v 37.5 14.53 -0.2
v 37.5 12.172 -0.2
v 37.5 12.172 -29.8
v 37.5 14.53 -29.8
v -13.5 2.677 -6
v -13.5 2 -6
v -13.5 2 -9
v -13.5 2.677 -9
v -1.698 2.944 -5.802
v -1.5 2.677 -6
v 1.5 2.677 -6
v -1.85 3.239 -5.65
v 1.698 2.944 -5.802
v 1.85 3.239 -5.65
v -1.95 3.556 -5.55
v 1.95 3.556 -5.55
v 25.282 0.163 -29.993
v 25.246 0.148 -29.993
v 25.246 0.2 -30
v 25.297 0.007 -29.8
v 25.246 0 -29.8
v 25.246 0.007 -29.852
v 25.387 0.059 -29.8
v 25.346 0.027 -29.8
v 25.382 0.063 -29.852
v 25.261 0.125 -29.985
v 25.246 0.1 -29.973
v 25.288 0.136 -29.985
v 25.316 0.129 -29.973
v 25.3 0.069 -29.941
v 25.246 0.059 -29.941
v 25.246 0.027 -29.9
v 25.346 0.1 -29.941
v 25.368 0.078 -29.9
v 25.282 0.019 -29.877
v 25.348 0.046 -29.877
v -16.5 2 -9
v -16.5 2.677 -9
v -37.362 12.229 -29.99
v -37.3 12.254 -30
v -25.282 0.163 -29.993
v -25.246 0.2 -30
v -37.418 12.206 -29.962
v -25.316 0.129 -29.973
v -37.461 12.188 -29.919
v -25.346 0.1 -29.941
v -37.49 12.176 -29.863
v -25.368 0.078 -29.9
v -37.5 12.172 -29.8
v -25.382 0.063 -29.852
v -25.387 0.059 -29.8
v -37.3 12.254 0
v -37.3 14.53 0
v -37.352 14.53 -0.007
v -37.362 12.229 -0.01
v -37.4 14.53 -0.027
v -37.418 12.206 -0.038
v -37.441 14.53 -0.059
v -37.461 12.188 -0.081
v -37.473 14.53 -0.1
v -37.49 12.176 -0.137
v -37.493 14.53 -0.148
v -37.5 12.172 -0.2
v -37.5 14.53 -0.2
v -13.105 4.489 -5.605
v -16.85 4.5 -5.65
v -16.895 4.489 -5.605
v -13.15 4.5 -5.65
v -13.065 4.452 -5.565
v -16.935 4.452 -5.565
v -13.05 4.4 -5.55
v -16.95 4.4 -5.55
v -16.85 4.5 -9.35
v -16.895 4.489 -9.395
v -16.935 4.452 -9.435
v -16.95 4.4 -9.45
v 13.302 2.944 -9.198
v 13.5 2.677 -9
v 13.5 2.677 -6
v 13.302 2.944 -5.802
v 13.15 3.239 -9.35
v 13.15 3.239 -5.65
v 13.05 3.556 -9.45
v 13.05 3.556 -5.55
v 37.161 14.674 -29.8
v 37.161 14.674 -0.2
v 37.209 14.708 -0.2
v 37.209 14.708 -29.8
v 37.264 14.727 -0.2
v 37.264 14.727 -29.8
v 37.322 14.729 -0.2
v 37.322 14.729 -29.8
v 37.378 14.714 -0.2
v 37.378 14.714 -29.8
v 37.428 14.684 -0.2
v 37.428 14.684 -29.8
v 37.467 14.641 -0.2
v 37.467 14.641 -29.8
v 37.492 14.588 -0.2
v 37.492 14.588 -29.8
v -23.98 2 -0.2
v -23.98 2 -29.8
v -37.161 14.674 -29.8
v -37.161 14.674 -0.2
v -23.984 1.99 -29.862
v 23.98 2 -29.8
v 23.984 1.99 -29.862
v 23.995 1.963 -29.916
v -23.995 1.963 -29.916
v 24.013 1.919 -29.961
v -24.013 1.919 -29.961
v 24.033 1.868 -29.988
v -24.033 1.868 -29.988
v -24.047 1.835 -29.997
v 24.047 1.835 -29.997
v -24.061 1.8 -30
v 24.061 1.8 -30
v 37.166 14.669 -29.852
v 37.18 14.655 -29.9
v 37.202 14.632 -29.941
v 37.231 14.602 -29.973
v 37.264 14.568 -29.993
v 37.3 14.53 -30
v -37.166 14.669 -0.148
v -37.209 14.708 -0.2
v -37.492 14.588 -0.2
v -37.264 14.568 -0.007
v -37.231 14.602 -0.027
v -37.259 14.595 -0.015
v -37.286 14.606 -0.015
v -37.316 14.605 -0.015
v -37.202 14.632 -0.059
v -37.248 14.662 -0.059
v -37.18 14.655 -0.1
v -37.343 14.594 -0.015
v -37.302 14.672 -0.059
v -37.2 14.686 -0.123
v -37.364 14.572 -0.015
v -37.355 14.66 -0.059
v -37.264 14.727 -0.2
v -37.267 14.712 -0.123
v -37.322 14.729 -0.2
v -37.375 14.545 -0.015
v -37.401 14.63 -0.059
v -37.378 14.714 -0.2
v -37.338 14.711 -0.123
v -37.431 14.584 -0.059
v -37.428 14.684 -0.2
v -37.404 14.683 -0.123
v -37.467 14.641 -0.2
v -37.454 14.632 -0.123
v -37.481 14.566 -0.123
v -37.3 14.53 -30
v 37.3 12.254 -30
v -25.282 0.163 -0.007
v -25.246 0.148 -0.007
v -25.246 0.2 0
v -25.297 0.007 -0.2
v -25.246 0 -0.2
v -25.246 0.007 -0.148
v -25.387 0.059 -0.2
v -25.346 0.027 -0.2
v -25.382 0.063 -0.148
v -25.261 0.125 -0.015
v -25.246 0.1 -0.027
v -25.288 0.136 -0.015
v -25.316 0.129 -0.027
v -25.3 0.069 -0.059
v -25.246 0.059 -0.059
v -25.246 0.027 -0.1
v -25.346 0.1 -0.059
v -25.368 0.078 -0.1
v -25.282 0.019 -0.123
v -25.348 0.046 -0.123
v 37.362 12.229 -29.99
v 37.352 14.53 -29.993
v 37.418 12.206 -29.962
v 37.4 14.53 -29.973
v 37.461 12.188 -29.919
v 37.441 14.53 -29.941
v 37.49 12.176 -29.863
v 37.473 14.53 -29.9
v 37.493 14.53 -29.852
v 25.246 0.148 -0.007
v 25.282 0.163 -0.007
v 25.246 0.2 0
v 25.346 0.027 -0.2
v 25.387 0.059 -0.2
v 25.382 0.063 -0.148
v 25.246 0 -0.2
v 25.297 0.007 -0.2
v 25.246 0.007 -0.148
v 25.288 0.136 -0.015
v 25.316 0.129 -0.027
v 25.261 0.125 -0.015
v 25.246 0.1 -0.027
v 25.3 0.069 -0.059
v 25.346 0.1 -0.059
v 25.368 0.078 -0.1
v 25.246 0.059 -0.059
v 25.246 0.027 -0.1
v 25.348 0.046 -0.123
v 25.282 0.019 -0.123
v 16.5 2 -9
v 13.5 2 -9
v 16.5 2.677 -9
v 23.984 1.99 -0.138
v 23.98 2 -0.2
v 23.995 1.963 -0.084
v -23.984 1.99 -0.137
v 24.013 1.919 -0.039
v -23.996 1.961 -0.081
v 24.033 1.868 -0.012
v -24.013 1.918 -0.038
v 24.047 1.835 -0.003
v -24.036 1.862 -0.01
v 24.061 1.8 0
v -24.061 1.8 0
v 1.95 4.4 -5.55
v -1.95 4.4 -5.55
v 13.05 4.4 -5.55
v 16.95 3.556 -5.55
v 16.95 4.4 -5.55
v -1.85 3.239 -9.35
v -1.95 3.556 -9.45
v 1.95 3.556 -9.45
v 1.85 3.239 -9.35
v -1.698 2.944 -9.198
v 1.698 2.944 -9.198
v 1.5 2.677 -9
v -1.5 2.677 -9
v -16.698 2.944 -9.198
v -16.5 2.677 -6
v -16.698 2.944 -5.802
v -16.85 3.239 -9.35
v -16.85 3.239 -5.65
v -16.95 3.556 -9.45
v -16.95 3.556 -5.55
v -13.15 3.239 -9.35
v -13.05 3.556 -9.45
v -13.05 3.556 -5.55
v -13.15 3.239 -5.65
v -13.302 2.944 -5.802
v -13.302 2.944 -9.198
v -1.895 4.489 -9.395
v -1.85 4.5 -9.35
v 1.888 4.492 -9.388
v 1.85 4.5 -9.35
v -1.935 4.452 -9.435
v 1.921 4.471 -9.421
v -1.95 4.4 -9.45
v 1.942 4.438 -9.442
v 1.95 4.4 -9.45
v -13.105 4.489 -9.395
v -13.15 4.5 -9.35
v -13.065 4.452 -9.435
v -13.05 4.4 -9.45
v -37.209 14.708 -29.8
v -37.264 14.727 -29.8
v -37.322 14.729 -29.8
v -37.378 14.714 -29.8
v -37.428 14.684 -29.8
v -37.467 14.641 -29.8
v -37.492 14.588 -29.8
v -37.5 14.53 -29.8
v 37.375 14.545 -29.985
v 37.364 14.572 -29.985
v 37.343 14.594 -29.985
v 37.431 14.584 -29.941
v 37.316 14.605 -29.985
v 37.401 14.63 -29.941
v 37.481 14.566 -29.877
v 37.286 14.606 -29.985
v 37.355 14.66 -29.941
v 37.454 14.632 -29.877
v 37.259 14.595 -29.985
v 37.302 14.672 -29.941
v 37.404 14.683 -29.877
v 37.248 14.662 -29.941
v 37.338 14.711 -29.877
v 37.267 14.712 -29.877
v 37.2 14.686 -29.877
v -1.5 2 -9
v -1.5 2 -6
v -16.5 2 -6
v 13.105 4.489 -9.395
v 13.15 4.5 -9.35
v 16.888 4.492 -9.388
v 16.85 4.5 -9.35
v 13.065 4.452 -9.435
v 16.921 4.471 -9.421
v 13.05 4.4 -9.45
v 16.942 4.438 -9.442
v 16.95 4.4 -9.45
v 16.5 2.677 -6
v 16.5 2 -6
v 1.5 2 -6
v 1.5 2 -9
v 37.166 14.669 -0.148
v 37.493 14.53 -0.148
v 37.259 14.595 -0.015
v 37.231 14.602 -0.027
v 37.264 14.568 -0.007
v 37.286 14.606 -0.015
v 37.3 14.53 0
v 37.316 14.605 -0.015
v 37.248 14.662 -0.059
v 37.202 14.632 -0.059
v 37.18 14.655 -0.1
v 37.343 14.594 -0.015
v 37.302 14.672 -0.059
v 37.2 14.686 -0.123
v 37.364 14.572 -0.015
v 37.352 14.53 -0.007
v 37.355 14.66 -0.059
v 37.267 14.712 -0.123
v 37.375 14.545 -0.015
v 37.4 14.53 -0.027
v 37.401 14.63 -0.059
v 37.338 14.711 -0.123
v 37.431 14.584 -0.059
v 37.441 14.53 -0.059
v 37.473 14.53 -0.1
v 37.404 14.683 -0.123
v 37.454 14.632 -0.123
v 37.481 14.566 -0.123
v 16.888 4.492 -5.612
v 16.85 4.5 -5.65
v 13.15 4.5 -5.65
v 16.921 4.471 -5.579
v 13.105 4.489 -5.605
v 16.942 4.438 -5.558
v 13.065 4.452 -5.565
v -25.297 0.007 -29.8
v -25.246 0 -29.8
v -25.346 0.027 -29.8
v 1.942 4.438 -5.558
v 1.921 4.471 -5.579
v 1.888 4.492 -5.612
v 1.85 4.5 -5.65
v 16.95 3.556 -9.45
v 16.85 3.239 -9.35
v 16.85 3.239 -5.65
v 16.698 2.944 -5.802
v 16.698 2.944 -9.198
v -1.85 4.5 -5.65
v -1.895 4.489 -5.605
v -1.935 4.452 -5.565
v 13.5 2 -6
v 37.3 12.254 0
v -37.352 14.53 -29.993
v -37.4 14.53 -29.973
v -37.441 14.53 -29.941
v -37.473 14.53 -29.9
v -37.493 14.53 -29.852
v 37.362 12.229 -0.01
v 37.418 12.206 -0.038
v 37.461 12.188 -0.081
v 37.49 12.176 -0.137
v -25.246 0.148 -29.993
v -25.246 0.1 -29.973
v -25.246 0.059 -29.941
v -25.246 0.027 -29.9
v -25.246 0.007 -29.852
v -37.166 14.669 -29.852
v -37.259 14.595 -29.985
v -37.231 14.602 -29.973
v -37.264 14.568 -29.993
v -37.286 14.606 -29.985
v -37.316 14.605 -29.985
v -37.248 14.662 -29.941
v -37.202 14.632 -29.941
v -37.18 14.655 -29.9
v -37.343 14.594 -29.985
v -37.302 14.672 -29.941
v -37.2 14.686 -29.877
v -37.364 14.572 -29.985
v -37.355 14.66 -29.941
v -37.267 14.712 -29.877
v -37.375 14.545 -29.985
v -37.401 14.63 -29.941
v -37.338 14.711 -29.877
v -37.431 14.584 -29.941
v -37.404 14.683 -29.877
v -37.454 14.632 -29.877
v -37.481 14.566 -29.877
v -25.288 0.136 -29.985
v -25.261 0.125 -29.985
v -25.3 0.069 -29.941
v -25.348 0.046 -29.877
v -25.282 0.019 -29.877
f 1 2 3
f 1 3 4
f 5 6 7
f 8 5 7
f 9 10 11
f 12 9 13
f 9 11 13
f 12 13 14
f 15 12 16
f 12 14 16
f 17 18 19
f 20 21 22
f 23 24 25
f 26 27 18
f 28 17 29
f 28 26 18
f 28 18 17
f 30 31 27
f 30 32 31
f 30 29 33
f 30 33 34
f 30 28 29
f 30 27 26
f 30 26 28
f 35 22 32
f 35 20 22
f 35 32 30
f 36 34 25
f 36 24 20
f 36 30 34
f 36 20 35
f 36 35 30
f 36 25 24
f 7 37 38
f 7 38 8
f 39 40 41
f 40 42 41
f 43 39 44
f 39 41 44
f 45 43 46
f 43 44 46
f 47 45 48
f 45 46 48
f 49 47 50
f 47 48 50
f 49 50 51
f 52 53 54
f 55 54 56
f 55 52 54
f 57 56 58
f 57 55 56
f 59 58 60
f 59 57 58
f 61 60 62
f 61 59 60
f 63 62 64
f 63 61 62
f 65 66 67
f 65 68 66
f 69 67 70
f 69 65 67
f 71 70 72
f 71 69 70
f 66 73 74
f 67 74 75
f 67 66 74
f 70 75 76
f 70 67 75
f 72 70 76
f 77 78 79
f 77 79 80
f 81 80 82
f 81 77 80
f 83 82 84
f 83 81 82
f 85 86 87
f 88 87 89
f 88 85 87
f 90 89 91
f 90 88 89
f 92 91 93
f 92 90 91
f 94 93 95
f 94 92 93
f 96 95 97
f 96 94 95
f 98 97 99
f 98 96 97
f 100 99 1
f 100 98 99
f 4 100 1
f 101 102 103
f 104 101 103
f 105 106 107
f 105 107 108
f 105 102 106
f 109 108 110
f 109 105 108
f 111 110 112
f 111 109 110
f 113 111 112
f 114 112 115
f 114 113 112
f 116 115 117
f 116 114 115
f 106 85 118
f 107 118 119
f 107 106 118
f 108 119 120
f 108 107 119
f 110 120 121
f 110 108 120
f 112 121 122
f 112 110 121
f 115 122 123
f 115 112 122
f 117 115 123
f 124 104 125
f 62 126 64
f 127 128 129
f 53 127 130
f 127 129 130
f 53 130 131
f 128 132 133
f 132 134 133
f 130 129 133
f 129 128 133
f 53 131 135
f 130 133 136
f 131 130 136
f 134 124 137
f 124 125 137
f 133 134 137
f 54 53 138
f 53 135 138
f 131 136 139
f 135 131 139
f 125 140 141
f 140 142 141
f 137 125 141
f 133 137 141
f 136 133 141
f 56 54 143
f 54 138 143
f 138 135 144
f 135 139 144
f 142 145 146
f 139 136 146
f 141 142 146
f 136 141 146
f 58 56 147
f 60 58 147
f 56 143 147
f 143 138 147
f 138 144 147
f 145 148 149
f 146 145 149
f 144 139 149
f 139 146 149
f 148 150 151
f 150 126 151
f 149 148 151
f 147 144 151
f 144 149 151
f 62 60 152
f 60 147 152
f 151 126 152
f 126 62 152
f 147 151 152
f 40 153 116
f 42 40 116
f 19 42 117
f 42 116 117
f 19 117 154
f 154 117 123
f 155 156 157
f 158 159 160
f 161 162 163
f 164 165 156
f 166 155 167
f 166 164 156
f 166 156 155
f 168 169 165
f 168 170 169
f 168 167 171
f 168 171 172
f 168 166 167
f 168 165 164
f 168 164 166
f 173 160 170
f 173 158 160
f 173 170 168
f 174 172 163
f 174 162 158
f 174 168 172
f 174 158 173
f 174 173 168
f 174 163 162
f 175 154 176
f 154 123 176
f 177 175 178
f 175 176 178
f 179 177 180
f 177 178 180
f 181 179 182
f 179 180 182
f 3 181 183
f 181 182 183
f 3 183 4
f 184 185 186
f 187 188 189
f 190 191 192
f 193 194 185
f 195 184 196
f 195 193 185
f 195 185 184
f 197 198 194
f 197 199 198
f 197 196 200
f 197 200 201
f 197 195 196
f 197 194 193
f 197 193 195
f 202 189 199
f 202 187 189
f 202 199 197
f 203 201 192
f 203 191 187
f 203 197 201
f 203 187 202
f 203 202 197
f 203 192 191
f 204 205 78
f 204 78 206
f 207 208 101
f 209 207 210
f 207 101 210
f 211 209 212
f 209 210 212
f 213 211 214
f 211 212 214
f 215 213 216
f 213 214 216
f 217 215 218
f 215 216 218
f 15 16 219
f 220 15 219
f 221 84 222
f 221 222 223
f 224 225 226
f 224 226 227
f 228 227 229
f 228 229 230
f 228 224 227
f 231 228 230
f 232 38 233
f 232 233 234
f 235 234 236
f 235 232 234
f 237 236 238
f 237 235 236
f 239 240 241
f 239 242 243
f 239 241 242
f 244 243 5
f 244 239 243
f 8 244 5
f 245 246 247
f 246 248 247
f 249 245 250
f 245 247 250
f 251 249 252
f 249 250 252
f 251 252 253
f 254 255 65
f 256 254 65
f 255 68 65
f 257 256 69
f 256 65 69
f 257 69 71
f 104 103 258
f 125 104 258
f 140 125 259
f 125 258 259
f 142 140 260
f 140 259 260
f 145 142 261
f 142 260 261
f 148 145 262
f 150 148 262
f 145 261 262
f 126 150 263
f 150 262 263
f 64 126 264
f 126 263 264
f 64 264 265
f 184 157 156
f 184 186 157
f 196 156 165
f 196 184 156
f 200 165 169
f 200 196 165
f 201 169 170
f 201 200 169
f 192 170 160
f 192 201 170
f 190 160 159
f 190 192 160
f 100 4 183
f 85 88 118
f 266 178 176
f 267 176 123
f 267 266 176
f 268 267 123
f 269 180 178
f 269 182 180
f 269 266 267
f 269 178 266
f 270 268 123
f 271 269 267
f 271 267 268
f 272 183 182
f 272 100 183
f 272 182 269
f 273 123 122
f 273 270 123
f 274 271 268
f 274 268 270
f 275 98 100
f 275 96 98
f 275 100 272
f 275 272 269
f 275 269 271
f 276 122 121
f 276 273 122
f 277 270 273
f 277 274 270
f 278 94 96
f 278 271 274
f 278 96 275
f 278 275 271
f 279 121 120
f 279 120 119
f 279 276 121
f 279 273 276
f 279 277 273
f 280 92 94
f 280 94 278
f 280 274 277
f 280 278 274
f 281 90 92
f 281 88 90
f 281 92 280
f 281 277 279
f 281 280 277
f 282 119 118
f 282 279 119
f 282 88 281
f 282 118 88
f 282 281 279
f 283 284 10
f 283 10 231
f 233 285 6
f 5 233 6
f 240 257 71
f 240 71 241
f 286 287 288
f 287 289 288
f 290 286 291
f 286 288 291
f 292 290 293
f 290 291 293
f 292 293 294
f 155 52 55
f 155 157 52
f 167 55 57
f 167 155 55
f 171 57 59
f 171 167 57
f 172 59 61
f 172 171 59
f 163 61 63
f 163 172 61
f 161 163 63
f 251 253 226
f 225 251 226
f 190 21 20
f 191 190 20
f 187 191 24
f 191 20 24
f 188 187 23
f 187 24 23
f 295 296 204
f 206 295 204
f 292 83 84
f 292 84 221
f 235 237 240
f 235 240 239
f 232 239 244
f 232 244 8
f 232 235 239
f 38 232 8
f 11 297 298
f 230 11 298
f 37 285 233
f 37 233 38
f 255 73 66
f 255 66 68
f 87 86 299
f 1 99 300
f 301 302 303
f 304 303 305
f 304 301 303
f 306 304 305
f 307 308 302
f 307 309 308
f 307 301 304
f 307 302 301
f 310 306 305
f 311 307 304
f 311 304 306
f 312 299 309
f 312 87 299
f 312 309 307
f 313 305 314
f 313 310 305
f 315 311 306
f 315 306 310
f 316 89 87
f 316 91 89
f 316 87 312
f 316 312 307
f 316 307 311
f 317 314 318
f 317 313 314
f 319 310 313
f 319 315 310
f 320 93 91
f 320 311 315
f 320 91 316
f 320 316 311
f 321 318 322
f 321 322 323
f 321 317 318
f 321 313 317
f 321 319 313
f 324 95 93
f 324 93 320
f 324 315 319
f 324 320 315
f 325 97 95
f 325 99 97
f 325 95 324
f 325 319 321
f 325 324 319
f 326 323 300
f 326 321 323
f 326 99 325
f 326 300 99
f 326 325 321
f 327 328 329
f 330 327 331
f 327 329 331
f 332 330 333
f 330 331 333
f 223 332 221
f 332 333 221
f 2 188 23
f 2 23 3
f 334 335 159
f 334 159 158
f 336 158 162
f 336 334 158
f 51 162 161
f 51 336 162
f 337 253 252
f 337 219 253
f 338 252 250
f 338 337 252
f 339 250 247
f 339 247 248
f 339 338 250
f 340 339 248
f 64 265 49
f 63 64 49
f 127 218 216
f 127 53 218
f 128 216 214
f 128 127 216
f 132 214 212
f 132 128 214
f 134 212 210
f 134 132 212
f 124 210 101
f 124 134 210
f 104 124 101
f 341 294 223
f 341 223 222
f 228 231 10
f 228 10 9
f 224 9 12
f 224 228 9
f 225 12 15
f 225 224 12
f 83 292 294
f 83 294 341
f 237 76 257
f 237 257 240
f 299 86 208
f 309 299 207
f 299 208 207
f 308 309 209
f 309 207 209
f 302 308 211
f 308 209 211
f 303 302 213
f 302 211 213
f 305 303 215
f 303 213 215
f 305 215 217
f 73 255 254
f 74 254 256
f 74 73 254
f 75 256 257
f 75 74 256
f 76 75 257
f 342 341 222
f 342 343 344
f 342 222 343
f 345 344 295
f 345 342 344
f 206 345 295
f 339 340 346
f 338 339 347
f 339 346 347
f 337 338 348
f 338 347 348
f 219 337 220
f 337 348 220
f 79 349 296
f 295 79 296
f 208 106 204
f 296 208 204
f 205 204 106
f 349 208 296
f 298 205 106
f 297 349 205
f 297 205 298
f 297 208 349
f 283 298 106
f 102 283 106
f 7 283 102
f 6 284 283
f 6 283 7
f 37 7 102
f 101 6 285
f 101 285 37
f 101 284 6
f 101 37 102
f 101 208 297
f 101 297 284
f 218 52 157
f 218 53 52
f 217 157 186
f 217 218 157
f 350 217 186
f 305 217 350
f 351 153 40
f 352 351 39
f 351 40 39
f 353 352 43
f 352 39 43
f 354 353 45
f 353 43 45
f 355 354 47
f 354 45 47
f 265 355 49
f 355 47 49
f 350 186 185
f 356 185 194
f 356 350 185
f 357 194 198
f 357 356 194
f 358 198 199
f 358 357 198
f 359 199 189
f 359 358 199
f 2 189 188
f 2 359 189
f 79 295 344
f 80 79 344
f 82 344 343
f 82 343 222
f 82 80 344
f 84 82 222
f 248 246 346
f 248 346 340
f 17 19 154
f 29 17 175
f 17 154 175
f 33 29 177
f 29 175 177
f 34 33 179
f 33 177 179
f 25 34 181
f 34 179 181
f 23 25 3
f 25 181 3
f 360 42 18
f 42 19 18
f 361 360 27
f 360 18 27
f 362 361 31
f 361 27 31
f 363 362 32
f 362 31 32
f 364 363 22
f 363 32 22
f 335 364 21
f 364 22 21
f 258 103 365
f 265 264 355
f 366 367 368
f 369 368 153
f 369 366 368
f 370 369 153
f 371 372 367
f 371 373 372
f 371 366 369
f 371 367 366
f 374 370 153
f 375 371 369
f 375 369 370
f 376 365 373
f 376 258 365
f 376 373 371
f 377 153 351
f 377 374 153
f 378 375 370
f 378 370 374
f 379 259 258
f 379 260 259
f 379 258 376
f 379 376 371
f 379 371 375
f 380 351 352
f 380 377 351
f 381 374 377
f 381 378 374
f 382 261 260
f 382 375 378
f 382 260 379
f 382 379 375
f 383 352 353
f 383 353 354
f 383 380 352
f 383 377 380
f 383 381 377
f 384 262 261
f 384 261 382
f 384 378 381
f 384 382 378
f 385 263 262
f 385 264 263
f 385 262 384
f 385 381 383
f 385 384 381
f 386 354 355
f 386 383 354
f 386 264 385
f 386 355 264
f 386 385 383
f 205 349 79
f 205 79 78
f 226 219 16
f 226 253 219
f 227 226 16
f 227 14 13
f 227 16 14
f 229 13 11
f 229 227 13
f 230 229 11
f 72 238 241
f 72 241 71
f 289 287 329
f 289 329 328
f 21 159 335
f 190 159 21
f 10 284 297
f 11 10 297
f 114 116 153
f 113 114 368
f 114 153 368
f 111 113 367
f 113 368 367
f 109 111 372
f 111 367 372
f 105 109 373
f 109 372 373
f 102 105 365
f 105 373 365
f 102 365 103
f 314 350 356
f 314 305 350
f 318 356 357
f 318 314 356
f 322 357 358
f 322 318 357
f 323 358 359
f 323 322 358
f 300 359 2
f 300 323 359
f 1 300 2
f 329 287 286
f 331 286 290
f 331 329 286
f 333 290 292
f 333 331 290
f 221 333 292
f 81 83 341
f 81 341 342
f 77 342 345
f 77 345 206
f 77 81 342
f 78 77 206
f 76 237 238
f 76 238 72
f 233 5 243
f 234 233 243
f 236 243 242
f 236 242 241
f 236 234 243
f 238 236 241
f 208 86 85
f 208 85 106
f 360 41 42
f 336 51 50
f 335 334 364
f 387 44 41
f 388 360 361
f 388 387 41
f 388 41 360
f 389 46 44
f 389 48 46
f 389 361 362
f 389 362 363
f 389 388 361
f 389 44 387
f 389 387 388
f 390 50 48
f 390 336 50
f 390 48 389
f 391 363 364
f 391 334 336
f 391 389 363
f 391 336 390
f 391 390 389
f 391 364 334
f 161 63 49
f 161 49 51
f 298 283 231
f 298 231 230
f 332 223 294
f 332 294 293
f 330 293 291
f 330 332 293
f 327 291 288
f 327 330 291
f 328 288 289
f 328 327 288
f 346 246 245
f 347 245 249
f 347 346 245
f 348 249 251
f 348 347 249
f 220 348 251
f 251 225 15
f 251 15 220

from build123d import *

# Parameters (mm, degrees)
EXTRUDE_1_DEPTH                 = 30
SKETCH_2_W                      = 3
SKETCH_2_H                      = 3
EXTRUDE_2_DEPTH                 = 1
EXTRUDE_START                   = -4
EXTRUDE_3_DEPTH                 = 5
CUT_EXTRUDE_1_REACH             = 52.312
CUT_EXTRUDE_1_DIRECTION_2_REACH = 52.312
FILLET_1_R                      = 0.1
PATTERN_LINEAR_1_COUNT          = 2
PATTERN_LINEAR_1_PITCH          = 15
PATTERN_LINEAR_1_COUNT_DIR2     = 2
PATTERN_LINEAR_1_PITCH_DIR2     = 15
FILLET_1_OF_PATTERN_LINEAR_1_R  = 0.1
FILLET_2_R                      = 0.2


with BuildPart() as part:
    # 草图1 → 凸台-拉伸1 (new body)
    with BuildSketch(Plane.XY):
        Polygon((-25.328427125, 0), (25.328427125, 0), (37.5, 12.171572875), (37.5, 15), (23.98, 2), (-23.98, 2), (-37.5, 15), (-37.5, 12.171572875), align=None)
    extrude(amount=-EXTRUDE_1_DEPTH)

    # 草图2 → 凸台-拉伸2 (add)
    with BuildSketch(Plane(origin=(0, 2, 0), x_dir=(1, 0, 0), z_dir=(0, 1, 0))):
        with Locations((0, 7.5)):
            Rectangle(SKETCH_2_W, SKETCH_2_H)
    extrude_2 = extrude(amount=EXTRUDE_2_DEPTH)

    # 草图3 → 凸台-拉伸3 (add)
    with BuildSketch(Plane.XY.offset(-6).offset(EXTRUDE_START)):
        with BuildLine():
            Line((-1.95, 4.5), (1.95, 4.5))
            Line((1.95, 4.5), (1.95, 3.555590279))
            ThreePointArc((1.95, 3.555590279), (1.780042303, 3.088161527), (1.5, 2.677124344))
            Line((1.5, 2.677124344), (-1.5, 2.677124344))
            ThreePointArc((-1.5, 2.677124344), (-1.780042303, 3.088161527), (-1.95, 3.555590279))
            Line((-1.95, 3.555590279), (-1.95, 4.5))
        make_face()
    extrude_3 = extrude(amount=EXTRUDE_3_DEPTH)

    # 草图4 → 切除-拉伸1 (cut, up to next)
    with BuildSketch(Plane(origin=(0, 0, 0), x_dir=(0, 0, -1), z_dir=(1, 0, 0)), mode=Mode.PRIVATE) as cut_extrude_1_sk1:
        with BuildLine():
            Line((10, 4.5), (9.45, 4.5))
            Line((9.45, 4.5), (9.45, 3.555590279))
            ThreePointArc((9.45, 3.555590279), (9.280042303, 3.088161527), (9, 2.677124344))
            Line((9, 2.677124344), (10, 2.677124344))
            Line((10, 2.677124344), (10, 4.5))
        make_face()
    cut_extrude_1_tool1 = extrude(cut_extrude_1_sk1.sketch, amount=-CUT_EXTRUDE_1_REACH, mode=Mode.PRIVATE) & part.part
    # 草图4 → 切除-拉伸1 (cut, up to next)
    with BuildSketch(Plane(origin=(0, 0, 0), x_dir=(0, 0, -1), z_dir=(1, 0, 0)), mode=Mode.PRIVATE) as cut_extrude_1_sk2:
        with BuildLine():
            Line((5, 4.5), (5, 2.677124344))
            Line((5, 2.677124344), (6, 2.677124344))
            ThreePointArc((6, 2.677124344), (5.719957697, 3.088161527), (5.55, 3.555590279))
            Line((5.55, 3.555590279), (5.55, 4.5))
            Line((5.55, 4.5), (5, 4.5))
        make_face()
    cut_extrude_1_tool2 = extrude(cut_extrude_1_sk2.sketch, amount=-CUT_EXTRUDE_1_REACH, mode=Mode.PRIVATE) & part.part
    cut_extrude_1_1 = cut_extrude_1_tool1.solids().sort_by_distance((0, 3.500125, -9.669375))[0]
    add(cut_extrude_1_1, mode=Mode.SUBTRACT)
    cut_extrude_1_2 = cut_extrude_1_tool2.solids().sort_by_distance((0, 3.500125, -5.330625))[0]
    add(cut_extrude_1_2, mode=Mode.SUBTRACT)
    cut_extrude_1 = cut_extrude_1_1 + cut_extrude_1_2  # 切除-拉伸1 as one shape, for the pattern or mirror that repeats it

    # 草图4 → 切除-拉伸1 direction 2 (cut, up to next)
    with BuildSketch(Plane(origin=(0, 0, 0), x_dir=(0, 0, -1), z_dir=(1, 0, 0)), mode=Mode.PRIVATE) as cut_extrude_1_direction_2_sk1:
        with BuildLine():
            Line((10, 4.5), (9.45, 4.5))
            Line((9.45, 4.5), (9.45, 3.555590279))
            ThreePointArc((9.45, 3.555590279), (9.280042303, 3.088161527), (9, 2.677124344))
            Line((9, 2.677124344), (10, 2.677124344))
            Line((10, 2.677124344), (10, 4.5))
        make_face()
    cut_extrude_1_direction_2_tool1 = extrude(cut_extrude_1_direction_2_sk1.sketch, amount=CUT_EXTRUDE_1_DIRECTION_2_REACH, mode=Mode.PRIVATE) & part.part
    # 草图4 → 切除-拉伸1 direction 2 (cut, up to next)
    with BuildSketch(Plane(origin=(0, 0, 0), x_dir=(0, 0, -1), z_dir=(1, 0, 0)), mode=Mode.PRIVATE) as cut_extrude_1_direction_2_sk2:
        with BuildLine():
            Line((5, 4.5), (5, 2.677124344))
            Line((5, 2.677124344), (6, 2.677124344))
            ThreePointArc((6, 2.677124344), (5.719957697, 3.088161527), (5.55, 3.555590279))
            Line((5.55, 3.555590279), (5.55, 4.5))
            Line((5.55, 4.5), (5, 4.5))
        make_face()
    cut_extrude_1_direction_2_tool2 = extrude(cut_extrude_1_direction_2_sk2.sketch, amount=CUT_EXTRUDE_1_DIRECTION_2_REACH, mode=Mode.PRIVATE) & part.part
    cut_extrude_1_direction_2_1 = cut_extrude_1_direction_2_tool1.solids().sort_by_distance((0, 3.500125, -9.669375))[0]
    add(cut_extrude_1_direction_2_1, mode=Mode.SUBTRACT)
    cut_extrude_1_direction_2_2 = cut_extrude_1_direction_2_tool2.solids().sort_by_distance((0, 3.500125, -5.330625))[0]
    add(cut_extrude_1_direction_2_2, mode=Mode.SUBTRACT)
    cut_extrude_1_direction_2 = cut_extrude_1_direction_2_1 + cut_extrude_1_direction_2_2  # 切除-拉伸1 direction 2 as one shape, for the pattern or mirror that repeats it

    # 圆角1
    fillet_1_edges = [part.edges().sort_by_distance(p)[0] for p in [
        (1.95, 4.5, -7.5),
        (-1.95, 4.5, -7.5),
        (0, 4.5, -9.45),
        (0, 4.5, -5.55),
    ]]
    fillet(fillet_1_edges, radius=FILLET_1_R)

    # 阵列(线性)1: 凸台-拉伸2, 凸台-拉伸3, 切除-拉伸1, 切除-拉伸1 direction 2 2 × 2
    with Locations(*[Vector(1, 0, 0) * (i * PATTERN_LINEAR_1_PITCH) + Vector(-1, 0, 0) * (j * PATTERN_LINEAR_1_PITCH_DIR2) for i in range(PATTERN_LINEAR_1_COUNT) for j in range(PATTERN_LINEAR_1_COUNT_DIR2) if (i, j) != (0, 0)]):
        add(extrude_2)
        add(extrude_3)
        add(cut_extrude_1, mode=Mode.SUBTRACT)
        add(cut_extrude_1_direction_2, mode=Mode.SUBTRACT)

    # 圆角1 of 阵列(线性)1
    fillet_1_of_pattern_linear_1_edges = [part.edges().sort_by_distance(p)[0] for p in [
        (-13.05, 4.5, -7.5),
        (-16.95, 4.5, -7.5),
        (-15, 4.5, -9.45),
        (-15, 4.5, -5.55),
        (16.95, 4.5, -7.5),
        (13.05, 4.5, -7.5),
        (15, 4.5, -9.45),
        (15, 4.5, -5.55),
        (1.95, 4.5, -7.5),
        (-1.95, 4.5, -7.5),
        (0, 4.5, -9.45),
        (0, 4.5, -5.55),
    ]]
    fillet(fillet_1_of_pattern_linear_1_edges, radius=FILLET_1_OF_PATTERN_LINEAR_1_R)

    # 圆角2
    fillet_2_edges = [part.edges().sort_by_distance(p)[0] for p in [
        (0, 0, -30),
        (-31.414213562, 6.085786438, 0),
        (-37.5, 13.585786438, 0),
        (31.414213562, 6.085786438, -30),
        (-37.5, 15, -15),
        (37.5, 15, -15),
        (25.328427125, 0, -15),
        (-25.328427125, 0, -15),
        (37.5, 13.585786438, -30),
        (30.74, 8.5, -30),
        (0, 2, -30),
        (-30.74, 8.5, -30),
        (-37.5, 13.585786438, -30),
        (-31.414213562, 6.085786438, -30),
        (-30.74, 8.5, 0),
        (0, 2, 0),
        (30.74, 8.5, 0),
        (37.5, 13.585786438, 0),
        (31.414213562, 6.085786438, 0),
        (0, 0, 0),
    ]]
    fillet(fillet_2_edges, radius=FILLET_2_R)


solid = part.part
